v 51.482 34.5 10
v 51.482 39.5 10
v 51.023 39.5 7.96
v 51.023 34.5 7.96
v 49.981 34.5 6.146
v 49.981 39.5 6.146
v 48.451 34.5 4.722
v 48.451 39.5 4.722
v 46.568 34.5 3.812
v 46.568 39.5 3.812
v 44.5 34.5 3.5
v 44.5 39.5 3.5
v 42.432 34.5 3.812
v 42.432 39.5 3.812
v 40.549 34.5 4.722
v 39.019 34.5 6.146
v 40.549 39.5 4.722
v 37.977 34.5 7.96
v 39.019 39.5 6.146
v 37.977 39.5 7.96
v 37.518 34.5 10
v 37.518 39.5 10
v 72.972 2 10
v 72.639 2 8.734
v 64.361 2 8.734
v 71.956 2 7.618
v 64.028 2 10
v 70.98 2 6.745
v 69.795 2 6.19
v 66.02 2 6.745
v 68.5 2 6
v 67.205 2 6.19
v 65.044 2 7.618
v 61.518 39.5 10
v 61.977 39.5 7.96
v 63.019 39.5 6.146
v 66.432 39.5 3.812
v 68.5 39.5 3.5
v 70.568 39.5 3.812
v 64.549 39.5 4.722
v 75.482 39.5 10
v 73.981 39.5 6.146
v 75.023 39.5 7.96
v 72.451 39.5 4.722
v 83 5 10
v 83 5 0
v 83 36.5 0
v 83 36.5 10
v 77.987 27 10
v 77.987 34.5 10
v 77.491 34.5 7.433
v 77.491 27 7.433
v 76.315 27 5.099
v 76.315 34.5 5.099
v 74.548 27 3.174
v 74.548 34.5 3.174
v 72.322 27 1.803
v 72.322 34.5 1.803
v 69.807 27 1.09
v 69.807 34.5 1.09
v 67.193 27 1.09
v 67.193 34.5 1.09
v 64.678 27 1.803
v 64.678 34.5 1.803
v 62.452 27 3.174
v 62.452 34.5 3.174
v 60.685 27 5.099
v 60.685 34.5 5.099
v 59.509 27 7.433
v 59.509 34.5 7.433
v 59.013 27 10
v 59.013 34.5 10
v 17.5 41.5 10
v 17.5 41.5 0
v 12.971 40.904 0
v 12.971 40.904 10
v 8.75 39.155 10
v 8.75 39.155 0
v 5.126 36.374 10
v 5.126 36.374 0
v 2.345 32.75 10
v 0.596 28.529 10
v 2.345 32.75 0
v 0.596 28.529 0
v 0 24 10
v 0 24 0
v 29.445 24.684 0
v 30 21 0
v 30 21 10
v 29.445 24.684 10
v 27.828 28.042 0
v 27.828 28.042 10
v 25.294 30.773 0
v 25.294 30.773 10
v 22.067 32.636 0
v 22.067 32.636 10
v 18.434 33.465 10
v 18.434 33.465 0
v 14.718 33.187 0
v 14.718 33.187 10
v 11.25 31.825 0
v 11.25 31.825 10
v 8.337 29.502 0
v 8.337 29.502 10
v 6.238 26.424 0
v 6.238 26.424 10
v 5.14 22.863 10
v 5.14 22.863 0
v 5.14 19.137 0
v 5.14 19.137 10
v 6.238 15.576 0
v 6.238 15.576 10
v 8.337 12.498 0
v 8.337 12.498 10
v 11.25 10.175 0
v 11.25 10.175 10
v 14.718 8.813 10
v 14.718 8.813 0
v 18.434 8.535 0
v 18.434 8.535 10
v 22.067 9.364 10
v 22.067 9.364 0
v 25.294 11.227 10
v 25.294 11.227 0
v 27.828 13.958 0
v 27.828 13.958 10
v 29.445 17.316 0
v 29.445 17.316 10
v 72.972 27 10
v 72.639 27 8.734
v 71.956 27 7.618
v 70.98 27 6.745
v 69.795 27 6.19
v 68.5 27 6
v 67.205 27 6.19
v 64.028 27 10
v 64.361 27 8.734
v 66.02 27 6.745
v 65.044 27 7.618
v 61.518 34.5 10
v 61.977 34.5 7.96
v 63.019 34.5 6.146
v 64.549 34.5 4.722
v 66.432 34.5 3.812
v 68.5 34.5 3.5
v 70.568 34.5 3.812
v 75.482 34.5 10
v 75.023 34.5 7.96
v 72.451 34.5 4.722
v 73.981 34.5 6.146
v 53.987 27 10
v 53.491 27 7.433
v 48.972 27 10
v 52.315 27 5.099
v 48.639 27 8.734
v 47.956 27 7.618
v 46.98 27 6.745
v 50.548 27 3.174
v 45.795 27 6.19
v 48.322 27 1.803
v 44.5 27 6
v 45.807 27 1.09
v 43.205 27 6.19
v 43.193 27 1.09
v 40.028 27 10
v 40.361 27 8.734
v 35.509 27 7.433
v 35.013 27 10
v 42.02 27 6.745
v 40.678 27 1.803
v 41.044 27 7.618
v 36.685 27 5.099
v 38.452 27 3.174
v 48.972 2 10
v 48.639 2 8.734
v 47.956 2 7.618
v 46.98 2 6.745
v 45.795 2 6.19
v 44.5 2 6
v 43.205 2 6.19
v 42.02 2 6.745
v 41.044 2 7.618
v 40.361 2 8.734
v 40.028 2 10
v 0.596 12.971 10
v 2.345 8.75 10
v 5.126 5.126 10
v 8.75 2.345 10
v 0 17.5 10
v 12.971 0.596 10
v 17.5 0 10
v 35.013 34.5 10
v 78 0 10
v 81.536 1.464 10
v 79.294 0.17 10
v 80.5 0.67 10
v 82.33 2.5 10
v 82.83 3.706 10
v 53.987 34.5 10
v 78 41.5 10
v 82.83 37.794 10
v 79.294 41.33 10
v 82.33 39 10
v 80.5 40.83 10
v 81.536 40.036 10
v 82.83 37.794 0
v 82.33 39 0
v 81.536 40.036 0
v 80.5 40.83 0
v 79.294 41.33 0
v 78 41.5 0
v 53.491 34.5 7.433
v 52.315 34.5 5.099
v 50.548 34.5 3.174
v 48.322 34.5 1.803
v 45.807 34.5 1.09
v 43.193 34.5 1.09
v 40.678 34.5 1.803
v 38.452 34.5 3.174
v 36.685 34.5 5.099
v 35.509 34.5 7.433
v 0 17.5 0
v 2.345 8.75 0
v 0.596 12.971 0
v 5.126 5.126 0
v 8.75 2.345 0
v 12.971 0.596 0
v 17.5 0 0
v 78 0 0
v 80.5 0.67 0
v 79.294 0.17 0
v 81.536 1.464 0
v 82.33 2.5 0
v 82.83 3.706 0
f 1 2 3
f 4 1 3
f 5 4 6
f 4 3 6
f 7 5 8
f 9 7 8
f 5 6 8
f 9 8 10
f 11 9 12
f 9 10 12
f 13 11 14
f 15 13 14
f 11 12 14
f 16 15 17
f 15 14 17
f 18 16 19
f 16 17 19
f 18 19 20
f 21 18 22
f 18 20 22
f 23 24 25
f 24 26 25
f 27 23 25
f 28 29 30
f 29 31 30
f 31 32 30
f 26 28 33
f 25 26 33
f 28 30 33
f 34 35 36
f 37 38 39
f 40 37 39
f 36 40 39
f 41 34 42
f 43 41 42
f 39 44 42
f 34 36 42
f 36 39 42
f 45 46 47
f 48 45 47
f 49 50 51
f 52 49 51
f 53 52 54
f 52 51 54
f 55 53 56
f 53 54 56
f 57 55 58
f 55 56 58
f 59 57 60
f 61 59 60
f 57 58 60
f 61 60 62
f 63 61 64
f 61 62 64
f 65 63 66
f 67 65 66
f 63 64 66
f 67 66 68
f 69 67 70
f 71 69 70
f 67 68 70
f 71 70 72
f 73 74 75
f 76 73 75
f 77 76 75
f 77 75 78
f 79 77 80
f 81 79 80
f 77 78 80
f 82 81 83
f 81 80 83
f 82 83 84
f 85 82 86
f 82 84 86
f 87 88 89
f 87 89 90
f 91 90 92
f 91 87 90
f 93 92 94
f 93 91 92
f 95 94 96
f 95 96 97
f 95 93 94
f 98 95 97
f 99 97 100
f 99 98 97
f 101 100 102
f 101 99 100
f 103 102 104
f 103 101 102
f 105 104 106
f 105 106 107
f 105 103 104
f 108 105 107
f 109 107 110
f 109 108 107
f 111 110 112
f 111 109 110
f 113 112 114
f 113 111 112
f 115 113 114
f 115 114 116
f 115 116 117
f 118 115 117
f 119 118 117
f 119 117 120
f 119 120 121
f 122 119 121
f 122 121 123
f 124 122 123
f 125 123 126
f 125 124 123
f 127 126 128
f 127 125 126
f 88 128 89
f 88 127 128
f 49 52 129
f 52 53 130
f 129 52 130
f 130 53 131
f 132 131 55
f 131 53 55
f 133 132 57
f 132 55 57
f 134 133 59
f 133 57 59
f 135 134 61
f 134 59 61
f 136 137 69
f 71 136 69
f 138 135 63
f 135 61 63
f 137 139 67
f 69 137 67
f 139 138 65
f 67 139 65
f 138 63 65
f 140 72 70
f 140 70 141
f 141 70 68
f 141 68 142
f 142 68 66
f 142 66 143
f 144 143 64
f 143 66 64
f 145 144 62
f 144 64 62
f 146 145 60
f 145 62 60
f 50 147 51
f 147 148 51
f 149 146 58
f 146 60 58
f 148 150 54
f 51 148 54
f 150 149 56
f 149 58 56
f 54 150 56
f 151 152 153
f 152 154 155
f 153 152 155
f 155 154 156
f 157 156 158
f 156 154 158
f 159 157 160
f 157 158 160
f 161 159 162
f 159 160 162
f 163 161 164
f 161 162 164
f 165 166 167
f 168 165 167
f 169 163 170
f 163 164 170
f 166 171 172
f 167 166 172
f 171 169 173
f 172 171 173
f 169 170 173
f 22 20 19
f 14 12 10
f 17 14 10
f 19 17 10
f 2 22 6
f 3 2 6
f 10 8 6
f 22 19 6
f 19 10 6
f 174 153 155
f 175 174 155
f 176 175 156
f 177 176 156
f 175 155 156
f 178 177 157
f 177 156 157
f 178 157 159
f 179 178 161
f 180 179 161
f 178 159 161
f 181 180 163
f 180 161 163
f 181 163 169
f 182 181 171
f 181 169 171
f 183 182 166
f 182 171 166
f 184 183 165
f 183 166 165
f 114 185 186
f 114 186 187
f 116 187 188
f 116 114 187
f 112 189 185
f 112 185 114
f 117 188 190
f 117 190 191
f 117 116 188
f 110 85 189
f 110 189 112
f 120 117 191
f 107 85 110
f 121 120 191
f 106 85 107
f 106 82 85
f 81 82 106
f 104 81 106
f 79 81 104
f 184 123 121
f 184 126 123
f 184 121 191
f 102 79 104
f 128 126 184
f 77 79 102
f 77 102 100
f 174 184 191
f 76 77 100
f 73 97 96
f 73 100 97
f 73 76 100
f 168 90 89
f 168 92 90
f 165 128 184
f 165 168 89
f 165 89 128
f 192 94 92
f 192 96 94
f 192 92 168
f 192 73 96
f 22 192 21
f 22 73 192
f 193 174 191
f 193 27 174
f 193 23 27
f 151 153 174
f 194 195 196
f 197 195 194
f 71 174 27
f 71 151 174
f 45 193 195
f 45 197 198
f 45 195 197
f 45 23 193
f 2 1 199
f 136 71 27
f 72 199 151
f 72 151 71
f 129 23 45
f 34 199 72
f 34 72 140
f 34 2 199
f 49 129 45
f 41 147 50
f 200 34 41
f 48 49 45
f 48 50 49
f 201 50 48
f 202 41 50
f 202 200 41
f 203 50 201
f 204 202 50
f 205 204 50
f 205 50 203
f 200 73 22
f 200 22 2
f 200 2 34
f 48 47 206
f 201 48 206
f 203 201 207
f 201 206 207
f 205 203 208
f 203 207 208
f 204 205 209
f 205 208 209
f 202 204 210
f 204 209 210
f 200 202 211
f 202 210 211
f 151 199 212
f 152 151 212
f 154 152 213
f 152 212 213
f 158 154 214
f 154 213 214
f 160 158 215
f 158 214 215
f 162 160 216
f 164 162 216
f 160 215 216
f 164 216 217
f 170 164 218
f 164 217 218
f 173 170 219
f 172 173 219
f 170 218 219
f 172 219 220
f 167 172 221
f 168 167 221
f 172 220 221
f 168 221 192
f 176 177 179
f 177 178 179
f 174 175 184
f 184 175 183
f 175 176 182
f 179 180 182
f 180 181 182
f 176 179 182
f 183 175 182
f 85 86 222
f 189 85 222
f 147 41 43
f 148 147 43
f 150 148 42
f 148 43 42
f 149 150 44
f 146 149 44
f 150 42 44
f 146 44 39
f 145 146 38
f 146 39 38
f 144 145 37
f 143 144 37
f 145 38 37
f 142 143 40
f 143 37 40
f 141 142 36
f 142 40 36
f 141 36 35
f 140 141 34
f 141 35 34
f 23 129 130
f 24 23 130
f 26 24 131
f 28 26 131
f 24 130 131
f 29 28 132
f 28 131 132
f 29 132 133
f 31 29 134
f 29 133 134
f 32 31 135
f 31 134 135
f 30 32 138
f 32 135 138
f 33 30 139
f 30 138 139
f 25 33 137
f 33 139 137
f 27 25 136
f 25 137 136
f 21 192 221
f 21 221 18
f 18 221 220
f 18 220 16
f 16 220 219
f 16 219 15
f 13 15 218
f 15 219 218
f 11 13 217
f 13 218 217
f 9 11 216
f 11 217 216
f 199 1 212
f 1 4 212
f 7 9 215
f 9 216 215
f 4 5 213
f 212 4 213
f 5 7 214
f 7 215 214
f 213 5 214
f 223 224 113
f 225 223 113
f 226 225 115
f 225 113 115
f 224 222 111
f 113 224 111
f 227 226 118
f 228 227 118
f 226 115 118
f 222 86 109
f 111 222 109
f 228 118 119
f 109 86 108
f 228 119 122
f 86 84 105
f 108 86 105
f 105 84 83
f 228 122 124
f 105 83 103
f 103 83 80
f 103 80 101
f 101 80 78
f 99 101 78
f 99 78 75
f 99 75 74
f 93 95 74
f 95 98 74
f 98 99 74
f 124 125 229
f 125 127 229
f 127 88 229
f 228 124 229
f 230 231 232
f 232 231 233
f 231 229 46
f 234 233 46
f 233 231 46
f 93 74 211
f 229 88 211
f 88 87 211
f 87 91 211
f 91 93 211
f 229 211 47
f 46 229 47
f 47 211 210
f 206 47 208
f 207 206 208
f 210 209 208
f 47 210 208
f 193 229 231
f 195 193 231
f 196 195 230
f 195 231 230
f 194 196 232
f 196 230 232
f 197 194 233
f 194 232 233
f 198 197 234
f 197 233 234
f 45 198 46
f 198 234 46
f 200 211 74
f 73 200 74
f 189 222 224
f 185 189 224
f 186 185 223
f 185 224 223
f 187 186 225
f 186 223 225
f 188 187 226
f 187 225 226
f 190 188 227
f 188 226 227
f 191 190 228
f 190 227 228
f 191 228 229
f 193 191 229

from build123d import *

# Parameters (mm, degrees)
F0_R     = 12.5
F1_DEPTH = 10


with BuildPart() as f1:
    # F0 (on Top) → F1 (new body)
    with BuildSketch(Plane.XY):
        with BuildLine():
            ThreePointArc((0, 17.5), (5.1256313292, 5.1256313292), (17.5, 0))
            Line((17.5, 0), (78, 0))
            ThreePointArc((78, 0), (81.5355339059, 1.4644660941), (83, 5))
            Line((83, 5), (83, 36.5))
            ThreePointArc((83, 36.5), (81.5355339059, 40.0355339059), (78, 41.5))
            Line((78, 41.5), (17.5, 41.5))
            ThreePointArc((17.5, 41.5), (5.1256313292, 36.3743686708), (0, 24))
            Line((0, 24), (0, 17.5))
        make_face()
        with Locations((17.5, 21)):
            Circle(F0_R, mode=Mode.SUBTRACT)
    extrude(amount=F1_DEPTH)

    # F3 (on offset) → F4 (revolve, cut)
    with BuildSketch(Plane.XY.offset(10.5)):
        Polygon((44.5, 27), (44.5, 2), (49, 2), (49, 27), (54, 27), (54, 34.5), (51.5, 34.5), (51.5, 39.5), (44.5, 39.5), (44.5, 34.5), align=None)
    revolve(axis=Axis((44.5, 14.5, 10.5), (0, 1, 0)), mode=Mode.SUBTRACT)

    # F3 (on offset) → F5 (revolve, cut)
    with BuildSketch(Plane.XY.offset(10.5)):
        Polygon((68.5, 27), (68.5, 2), (73, 2), (73, 27), (78, 27), (78, 34.5), (75.5, 34.5), (75.5, 39.5), (68.5, 39.5), (68.5, 34.5), align=None)
    revolve(axis=Axis((68.5, 14.5, 10.5), (0, 1, 0)), mode=Mode.SUBTRACT)


solid = f1.part
